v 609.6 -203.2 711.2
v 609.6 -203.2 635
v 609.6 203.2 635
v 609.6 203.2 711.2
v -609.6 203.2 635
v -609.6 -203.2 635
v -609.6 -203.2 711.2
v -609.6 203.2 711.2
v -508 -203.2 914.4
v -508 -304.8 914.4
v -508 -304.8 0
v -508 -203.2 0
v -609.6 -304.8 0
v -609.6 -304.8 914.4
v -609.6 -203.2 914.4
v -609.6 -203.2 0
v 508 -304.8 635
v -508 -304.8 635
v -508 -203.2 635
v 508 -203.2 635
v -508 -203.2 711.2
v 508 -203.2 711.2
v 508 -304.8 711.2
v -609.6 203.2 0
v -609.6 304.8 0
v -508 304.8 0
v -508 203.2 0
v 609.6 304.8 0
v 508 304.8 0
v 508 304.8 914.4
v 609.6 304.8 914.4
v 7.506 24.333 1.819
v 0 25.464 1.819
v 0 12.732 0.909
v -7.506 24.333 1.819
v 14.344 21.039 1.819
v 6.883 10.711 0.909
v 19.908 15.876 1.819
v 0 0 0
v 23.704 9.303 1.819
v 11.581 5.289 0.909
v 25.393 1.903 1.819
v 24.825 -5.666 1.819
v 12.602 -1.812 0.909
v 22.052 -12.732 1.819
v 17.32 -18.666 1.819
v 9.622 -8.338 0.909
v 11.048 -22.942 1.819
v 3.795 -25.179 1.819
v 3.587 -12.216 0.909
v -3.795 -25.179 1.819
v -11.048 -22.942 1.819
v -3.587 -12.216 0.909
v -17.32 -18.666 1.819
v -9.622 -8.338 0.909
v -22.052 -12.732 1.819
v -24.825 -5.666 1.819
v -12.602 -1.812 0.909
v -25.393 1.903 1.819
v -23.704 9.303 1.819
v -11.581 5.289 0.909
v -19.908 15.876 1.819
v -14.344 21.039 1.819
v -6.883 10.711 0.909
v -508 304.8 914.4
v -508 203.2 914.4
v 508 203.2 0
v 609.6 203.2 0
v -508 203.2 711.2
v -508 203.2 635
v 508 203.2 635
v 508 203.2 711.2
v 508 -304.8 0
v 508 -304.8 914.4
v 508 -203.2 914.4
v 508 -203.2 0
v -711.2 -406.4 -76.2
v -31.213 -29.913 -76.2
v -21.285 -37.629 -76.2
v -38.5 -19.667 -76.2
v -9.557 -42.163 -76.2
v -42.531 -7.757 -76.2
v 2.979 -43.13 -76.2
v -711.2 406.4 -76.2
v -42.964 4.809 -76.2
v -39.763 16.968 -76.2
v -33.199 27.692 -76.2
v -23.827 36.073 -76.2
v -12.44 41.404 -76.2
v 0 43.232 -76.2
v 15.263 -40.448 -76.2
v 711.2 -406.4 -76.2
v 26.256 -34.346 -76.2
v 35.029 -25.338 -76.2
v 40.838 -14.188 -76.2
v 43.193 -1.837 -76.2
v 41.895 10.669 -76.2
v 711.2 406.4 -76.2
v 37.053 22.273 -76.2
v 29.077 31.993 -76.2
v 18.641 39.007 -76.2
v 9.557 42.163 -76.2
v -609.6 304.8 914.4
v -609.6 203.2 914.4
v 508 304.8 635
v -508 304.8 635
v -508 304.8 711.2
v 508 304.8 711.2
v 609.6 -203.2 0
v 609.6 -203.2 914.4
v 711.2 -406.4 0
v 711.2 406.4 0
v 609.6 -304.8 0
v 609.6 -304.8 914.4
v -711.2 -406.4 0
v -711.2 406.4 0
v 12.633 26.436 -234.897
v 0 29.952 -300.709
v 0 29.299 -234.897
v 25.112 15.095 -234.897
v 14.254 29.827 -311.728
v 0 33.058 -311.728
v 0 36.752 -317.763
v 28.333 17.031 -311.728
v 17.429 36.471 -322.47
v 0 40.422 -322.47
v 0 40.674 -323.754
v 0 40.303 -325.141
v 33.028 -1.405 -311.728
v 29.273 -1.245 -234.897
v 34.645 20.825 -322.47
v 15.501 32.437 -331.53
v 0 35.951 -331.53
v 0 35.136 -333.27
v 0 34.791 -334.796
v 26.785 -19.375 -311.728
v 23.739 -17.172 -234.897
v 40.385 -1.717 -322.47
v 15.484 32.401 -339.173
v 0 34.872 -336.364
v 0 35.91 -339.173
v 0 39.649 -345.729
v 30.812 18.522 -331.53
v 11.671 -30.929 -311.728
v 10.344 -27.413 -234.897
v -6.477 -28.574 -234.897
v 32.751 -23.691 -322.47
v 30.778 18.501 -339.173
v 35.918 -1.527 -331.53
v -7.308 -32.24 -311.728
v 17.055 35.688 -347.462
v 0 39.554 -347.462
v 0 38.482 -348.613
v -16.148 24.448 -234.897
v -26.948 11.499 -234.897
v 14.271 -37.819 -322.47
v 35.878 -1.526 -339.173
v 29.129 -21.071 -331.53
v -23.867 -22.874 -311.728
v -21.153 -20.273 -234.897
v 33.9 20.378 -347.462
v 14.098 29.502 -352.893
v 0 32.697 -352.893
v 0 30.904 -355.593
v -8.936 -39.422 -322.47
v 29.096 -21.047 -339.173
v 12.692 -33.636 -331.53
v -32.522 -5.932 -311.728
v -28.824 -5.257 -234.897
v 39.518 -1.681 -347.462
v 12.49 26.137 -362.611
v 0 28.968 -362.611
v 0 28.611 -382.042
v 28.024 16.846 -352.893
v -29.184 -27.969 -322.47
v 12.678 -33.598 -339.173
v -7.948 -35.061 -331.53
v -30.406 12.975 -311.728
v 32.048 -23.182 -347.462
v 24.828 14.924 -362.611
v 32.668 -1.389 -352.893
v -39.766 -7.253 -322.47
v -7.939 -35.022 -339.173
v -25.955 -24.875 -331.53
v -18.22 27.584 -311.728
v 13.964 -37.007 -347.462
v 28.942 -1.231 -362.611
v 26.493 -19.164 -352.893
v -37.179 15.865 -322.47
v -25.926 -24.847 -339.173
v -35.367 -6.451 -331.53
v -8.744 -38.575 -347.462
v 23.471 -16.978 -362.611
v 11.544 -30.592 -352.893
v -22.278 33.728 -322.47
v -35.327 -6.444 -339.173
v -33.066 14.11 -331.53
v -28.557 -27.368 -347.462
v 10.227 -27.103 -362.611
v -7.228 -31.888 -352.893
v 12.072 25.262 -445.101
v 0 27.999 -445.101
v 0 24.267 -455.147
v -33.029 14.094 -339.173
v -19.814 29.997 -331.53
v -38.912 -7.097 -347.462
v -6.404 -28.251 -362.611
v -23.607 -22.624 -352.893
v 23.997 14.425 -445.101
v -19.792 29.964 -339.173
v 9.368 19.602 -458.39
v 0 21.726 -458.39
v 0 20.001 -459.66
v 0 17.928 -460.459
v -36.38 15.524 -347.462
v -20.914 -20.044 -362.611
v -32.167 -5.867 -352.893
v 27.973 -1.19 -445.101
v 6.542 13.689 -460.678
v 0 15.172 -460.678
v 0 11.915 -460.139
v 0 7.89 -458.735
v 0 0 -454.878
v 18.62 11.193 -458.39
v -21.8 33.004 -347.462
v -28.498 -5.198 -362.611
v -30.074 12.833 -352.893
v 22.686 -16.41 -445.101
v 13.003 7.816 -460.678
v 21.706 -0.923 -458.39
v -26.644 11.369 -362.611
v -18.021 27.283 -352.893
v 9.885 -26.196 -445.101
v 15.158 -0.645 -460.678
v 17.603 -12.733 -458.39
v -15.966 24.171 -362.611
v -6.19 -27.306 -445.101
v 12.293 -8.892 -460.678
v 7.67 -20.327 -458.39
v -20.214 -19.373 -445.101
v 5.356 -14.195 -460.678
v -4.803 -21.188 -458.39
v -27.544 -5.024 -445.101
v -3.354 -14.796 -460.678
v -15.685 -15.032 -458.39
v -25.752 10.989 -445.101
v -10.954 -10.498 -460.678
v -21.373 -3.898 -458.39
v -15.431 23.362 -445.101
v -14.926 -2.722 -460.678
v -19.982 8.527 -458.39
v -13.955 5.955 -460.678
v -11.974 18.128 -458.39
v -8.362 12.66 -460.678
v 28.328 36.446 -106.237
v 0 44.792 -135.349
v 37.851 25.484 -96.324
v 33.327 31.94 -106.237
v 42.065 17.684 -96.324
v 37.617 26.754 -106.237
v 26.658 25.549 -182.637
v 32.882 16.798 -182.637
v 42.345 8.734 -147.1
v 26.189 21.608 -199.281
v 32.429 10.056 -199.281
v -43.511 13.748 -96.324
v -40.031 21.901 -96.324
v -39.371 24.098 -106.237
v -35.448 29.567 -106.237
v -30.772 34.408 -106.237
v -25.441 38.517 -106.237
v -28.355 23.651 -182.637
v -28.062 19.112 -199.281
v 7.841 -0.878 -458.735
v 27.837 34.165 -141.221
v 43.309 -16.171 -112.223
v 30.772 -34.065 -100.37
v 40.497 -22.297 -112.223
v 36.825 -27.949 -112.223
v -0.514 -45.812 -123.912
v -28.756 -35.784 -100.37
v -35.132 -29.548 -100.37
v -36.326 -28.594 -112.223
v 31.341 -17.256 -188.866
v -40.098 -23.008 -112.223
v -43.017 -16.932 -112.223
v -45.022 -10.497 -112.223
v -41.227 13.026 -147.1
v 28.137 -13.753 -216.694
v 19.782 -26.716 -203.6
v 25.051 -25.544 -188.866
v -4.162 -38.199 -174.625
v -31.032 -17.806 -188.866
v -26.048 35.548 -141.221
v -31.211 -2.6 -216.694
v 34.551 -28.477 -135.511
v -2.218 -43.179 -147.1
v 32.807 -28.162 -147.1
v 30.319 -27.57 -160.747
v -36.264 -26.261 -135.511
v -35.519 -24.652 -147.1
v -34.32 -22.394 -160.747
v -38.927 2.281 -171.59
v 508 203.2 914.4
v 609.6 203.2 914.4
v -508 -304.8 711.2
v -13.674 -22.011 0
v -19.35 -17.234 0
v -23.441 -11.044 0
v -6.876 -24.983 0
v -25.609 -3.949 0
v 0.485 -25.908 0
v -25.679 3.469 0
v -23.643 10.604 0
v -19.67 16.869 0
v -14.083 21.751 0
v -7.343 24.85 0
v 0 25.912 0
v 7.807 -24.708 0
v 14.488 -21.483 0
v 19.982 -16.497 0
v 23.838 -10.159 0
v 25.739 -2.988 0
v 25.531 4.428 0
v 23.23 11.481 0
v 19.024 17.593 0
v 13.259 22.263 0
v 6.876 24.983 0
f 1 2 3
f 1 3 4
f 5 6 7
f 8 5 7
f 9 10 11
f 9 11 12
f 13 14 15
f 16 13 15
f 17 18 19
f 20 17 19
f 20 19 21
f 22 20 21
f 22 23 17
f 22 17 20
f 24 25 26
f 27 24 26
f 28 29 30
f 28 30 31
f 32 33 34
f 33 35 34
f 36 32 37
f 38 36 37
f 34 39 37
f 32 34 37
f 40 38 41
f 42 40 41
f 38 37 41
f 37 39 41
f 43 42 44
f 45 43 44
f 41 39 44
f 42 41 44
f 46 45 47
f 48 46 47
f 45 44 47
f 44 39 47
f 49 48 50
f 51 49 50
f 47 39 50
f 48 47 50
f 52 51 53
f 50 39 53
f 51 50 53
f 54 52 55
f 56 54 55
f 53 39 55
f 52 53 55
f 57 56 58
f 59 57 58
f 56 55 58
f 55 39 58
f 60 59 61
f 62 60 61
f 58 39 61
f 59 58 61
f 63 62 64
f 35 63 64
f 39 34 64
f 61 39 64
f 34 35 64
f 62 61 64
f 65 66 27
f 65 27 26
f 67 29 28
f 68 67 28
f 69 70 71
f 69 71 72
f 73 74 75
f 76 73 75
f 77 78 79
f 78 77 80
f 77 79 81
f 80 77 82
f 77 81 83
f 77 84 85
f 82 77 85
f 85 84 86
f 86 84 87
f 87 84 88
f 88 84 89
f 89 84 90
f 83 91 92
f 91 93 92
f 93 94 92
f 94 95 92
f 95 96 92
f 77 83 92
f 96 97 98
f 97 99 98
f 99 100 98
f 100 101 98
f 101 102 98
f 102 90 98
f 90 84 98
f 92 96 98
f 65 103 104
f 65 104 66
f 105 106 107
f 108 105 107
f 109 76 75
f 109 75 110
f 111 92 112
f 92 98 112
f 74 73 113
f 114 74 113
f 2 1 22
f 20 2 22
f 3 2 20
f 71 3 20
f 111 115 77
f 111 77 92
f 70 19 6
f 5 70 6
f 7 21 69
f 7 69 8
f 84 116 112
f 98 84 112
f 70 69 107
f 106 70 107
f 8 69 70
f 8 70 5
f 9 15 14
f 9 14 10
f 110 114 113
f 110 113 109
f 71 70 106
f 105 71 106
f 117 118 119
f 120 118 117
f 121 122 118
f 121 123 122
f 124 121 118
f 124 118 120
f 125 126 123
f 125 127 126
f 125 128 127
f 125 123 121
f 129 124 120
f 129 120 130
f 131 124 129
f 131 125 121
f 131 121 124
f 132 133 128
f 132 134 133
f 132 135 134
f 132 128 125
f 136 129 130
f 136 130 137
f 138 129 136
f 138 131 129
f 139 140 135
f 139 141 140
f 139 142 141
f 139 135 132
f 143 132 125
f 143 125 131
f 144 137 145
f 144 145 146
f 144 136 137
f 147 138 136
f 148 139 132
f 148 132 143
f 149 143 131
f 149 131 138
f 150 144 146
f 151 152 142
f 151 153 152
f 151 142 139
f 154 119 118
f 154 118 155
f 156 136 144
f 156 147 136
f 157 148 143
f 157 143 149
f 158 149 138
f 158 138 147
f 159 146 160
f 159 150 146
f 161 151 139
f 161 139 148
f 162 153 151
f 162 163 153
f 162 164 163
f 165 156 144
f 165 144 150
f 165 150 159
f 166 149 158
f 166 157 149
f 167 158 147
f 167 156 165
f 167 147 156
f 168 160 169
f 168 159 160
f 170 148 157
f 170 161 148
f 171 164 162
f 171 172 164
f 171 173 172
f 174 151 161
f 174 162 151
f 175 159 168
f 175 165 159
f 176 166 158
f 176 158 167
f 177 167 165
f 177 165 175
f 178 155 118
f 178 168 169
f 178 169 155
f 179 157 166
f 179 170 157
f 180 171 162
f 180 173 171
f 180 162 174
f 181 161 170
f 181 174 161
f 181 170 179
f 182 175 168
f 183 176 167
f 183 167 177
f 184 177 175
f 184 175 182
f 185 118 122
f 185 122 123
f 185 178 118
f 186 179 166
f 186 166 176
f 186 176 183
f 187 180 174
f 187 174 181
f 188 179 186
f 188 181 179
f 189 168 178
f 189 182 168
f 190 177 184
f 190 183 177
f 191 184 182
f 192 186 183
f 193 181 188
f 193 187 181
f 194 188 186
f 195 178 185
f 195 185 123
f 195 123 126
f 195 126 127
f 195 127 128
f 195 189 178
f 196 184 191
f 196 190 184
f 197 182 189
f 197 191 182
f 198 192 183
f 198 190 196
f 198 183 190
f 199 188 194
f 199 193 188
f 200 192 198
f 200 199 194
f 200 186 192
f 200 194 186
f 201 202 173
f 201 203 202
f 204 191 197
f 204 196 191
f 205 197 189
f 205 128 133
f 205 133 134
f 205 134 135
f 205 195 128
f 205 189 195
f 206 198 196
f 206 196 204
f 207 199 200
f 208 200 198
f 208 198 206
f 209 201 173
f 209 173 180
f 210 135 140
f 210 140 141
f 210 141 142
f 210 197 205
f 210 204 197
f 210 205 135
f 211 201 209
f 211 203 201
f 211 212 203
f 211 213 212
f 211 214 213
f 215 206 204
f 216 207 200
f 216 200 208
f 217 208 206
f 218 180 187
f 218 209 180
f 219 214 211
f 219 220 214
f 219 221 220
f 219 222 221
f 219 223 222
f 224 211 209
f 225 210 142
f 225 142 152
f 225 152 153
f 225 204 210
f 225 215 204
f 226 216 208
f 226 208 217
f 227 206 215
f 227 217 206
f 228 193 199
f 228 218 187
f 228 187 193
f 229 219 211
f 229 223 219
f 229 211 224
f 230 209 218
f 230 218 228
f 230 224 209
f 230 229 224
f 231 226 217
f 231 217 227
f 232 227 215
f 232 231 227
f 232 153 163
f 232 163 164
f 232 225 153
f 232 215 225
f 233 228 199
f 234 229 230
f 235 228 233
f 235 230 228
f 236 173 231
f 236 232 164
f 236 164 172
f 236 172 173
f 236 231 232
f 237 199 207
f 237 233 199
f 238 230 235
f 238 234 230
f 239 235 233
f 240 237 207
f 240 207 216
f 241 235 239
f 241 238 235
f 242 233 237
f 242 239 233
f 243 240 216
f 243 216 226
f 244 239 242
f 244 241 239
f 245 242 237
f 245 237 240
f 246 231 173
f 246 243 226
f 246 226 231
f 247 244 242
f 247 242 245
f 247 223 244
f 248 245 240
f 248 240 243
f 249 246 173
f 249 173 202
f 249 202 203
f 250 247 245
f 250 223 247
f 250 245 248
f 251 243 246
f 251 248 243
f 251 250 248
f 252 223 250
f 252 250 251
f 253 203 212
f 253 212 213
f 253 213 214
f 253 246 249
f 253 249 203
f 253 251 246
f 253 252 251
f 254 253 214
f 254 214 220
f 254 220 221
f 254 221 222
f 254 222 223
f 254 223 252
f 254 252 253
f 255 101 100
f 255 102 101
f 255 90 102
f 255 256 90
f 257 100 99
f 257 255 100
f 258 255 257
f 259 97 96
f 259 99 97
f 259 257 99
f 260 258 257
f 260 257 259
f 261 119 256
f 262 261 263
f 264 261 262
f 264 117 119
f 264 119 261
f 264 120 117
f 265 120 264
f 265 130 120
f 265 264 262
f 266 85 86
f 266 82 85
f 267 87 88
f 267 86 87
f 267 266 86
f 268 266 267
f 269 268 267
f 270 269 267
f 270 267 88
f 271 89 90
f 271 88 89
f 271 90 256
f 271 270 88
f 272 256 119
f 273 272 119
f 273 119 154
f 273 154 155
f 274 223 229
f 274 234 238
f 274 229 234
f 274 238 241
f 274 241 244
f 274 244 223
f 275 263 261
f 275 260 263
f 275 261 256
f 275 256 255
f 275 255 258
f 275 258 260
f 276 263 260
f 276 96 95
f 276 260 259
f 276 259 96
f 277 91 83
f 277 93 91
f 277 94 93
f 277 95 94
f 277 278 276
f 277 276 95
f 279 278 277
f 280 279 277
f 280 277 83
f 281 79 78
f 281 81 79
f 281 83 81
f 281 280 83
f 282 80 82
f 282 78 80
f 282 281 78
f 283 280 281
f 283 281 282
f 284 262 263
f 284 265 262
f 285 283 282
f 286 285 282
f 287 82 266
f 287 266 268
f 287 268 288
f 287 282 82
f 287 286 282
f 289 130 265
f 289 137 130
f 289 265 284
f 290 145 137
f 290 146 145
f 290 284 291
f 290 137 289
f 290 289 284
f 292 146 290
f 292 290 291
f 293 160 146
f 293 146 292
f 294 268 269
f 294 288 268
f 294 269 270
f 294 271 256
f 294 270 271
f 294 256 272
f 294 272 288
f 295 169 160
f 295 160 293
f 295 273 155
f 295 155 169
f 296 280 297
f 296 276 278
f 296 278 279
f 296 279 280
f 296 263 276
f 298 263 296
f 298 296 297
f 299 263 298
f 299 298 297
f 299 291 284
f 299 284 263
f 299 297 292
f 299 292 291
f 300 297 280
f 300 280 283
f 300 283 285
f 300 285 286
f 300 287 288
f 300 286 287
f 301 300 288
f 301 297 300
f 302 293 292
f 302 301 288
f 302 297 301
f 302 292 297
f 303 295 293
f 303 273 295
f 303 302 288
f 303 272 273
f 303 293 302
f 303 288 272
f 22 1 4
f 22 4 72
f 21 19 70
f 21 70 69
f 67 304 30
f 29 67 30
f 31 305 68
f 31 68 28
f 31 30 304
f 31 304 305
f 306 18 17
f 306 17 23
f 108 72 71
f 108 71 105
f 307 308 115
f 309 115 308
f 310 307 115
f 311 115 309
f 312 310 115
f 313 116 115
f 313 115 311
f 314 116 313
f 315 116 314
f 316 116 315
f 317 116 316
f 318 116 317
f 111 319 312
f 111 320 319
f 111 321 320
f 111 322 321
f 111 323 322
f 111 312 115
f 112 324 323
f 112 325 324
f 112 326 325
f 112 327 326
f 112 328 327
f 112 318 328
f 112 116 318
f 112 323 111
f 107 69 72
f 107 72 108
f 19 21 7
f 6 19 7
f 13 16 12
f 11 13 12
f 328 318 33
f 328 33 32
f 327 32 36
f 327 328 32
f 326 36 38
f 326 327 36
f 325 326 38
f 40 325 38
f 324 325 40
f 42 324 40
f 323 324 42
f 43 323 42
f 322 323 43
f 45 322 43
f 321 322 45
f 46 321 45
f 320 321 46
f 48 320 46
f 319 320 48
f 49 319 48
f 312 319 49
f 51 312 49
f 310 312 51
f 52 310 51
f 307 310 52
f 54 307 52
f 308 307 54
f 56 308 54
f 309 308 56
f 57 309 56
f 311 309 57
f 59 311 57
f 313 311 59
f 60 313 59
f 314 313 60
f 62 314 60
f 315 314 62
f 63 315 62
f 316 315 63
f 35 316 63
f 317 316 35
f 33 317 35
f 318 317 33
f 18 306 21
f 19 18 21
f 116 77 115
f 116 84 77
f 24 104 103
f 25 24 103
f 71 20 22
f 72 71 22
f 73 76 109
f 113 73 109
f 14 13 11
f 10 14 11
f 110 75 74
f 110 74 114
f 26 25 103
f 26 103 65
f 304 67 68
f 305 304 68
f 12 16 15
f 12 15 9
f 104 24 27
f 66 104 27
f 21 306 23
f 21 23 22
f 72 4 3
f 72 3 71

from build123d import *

# Parameters (mm, degrees)
F0_W          = 101.6
F0_H          = 101.6
F1_DEPTH      = 914.4
F2_W          = 101.6
F2_H          = 76.2
F3_DEPTH      = 1016
F4_W          = 101.6
F4_H          = 76.2
F5_DEPTH      = 406.4
F6_W          = 1422.4
F6_H          = 76.2
F7_DEPTH      = 406.4
F7_DEPTH_BACK = 406.4


with BuildPart() as f1:
    # F0 (on Top) → F1 (new body)
    with BuildSketch(Plane.XY):
        with Locations((-558.8, 254)):
            Rectangle(F0_W, F0_H)
    extrude(amount=F1_DEPTH)


with BuildPart() as f1b:
    # F0 (on Top) → F1, piece 2 (new body)
    with BuildSketch(Plane.XY):
        with Locations((-558.8, -254)):
            Rectangle(F0_W, F0_H)
    extrude(amount=F1_DEPTH)


with BuildPart() as f1c:
    # F0 (on Top) → F1, piece 3 (new body)
    with BuildSketch(Plane.XY):
        with Locations((558.8, 254)):
            Rectangle(F0_W, F0_H)
    extrude(amount=F1_DEPTH)


with BuildPart() as f1d:
    # F0 (on Top) → F1, piece 4 (new body)
    with BuildSketch(Plane.XY):
        with Locations((558.8, -254)):
            Rectangle(F0_W, F0_H)
    extrude(amount=F1_DEPTH)


with BuildPart() as f3:
    # F2 (on face) → F3 (new body)
    with BuildSketch(Plane.YZ.offset(-508)):
        with Locations((-254, 673.1)):
            Rectangle(F2_W, F2_H)
    extrude(amount=F3_DEPTH)


with BuildPart() as f3b:
    # F2 (on face) → F3, piece 2 (new body)
    with BuildSketch(Plane.YZ.offset(-508)):
        with Locations((254, 673.1)):
            Rectangle(F2_W, F2_H)
    extrude(amount=F3_DEPTH)


with BuildPart() as f5:
    # F4 (on face) → F5 (new body)
    with BuildSketch(Plane(origin=(0, -203.2, 0), x_dir=(-1, 0, 0), z_dir=(0, 1, 0))):
        with Locations((-558.8, 673.1)):
            Rectangle(F4_W, F4_H)
    extrude(amount=F5_DEPTH)


with BuildPart() as f5b:
    # F4 (on face) → F5, piece 2 (new body)
    with BuildSketch(Plane(origin=(0, -203.2, 0), x_dir=(-1, 0, 0), z_dir=(0, 1, 0))):
        with Locations((558.8, 673.1)):
            Rectangle(F4_W, F4_H)
    extrude(amount=F5_DEPTH)


with BuildPart() as f7:
    # F6 (on Front) → F7 (new body, two sides)
    with BuildSketch(Plane.XZ) as f7_sk:
        with Locations((0, -38.1)):
            Rectangle(F6_W, F6_H)
    extrude(amount=-F7_DEPTH)
    extrude(f7_sk.sketch, amount=F7_DEPTH_BACK)

    # F8 (on Right) → F9 (revolve)
    with BuildSketch(Plane.YZ):
        with BuildLine():
            Line((25.4638567567, 1.8187186215), (0, 0))
            Line((0, 0), (0, -454.8777937889))
            add(Edge.make_bspline(
                [(25.4638567567, 1.8187186215), (34.4382523346, -34.7031738143), (56.9012899023, -111.0496230705), (27.0788695893, -207.6950770004), (25.4154335933, -313.8808837767), (45.3355488252, -323.2209863813), (29.4925793524, -334.9241454751), (44.8346681145, -348.3242520498), (22.854328945, -351.7448701182), (34.6092554991, -416.712042373), (25.1374166029, -468.0172844227), (7.2653372186, -458.674717409), (0, -454.8777937889)],
                knots=[0, 0, 0, 0, 0.1664097973, 0.3295758434, 0.484052475, 0.538930427, 0.5944440202, 0.6498239949, 0.7009186508, 0.8259523875, 0.9293484076, 1, 1, 1, 1], degree=3))
        make_face()
    revolve(axis=Axis((0, 0, -227.4388968945), (0, 0, -1)))


solid = Compound([f1.part, f1b.part, f1c.part, f1d.part, f3.part, f3b.part, f5.part, f5b.part, f7.part])
